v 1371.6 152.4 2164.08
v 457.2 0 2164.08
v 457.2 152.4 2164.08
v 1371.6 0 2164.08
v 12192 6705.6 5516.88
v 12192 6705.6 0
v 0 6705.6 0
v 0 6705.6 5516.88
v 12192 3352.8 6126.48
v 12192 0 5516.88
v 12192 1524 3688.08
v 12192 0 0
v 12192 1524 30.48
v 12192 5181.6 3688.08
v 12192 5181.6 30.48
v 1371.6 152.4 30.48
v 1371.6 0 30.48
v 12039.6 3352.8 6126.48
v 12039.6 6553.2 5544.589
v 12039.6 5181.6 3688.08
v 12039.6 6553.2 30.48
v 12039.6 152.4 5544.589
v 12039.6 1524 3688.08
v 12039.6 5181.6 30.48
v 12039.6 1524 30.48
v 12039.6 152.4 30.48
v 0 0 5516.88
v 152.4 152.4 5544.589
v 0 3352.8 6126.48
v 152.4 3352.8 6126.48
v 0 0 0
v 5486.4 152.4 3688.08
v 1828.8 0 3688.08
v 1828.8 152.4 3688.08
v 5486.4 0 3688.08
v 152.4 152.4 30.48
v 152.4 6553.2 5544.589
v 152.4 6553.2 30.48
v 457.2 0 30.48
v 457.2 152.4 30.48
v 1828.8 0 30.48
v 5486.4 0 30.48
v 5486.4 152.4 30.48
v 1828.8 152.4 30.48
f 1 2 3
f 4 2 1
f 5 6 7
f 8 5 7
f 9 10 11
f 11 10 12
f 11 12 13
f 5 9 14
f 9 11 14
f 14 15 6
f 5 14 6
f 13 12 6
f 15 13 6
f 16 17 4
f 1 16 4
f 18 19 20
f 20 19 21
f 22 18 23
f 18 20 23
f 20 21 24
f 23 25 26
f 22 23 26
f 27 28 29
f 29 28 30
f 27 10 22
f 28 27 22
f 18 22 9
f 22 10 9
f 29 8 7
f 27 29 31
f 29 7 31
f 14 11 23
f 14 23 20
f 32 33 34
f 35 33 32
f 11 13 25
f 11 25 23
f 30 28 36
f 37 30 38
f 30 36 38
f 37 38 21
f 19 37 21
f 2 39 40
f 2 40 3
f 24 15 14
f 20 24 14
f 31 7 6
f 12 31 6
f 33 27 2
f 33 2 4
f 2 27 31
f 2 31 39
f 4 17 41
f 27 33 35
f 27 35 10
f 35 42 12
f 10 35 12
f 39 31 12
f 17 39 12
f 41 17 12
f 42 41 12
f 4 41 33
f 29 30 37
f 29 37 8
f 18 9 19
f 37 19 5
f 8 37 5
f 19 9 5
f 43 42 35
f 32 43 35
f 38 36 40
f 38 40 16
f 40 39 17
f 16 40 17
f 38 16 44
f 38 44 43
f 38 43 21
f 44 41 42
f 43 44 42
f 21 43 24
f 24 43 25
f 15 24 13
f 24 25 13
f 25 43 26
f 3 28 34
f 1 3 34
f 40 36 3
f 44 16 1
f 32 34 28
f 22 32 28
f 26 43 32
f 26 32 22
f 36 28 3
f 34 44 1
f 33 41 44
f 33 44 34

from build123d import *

# Parameters (mm, degrees)
F0_W      = 12192
F0_H      = 6705.6
F1_DEPTH  = 30.48
F2_W      = 11887.2
F2_H      = 152.4
F3_DEPTH  = 6096
F5_DEPTH  = 12192.001
F6_W      = 3657.6
F6_H      = 3657.6
F7_DEPTH  = 152.4
F8_W      = 3657.6
F8_H      = 3657.6
F9_DEPTH  = 152.4
F10_W     = 914.4
F10_H     = 2133.6
F11_DEPTH = 152.4


with BuildPart() as f1:
    # F0 (on Top) → F1 (new body)
    with BuildSketch(Plane.XY):
        with Locations((6096, 3352.8)):
            Rectangle(F0_W, F0_H)
    extrude(amount=F1_DEPTH)

    # F2 (on face) → F3 (join)
    with BuildSketch(Plane.XY.offset(30.48)):
        Polygon((152.4, 6705.6), (0, 6705.6), (0, 0), (152.4, 0), (152.4, 152.4), (152.4, 6553.2), align=None)
        Polygon((12192, 6705.6), (152.4, 6705.6), (152.4, 6553.2), (12039.6, 6553.2), (12192, 6553.2), align=None)
        with Locations((6096, 76.2)):
            Rectangle(F2_W, F2_H)
        Polygon((12192, 6553.2), (12039.6, 6553.2), (12039.6, 152.4), (12039.6, 0), (12192, 0), align=None)
    extrude(amount=F3_DEPTH)

    # F4 (on face) → F5 (cut, through all)
    with BuildSketch(Plane.YZ.offset(12192)):
        Polygon((6705.6, 6126.48), (3352.8, 6126.48), (6705.6, 5516.88), align=None)
        Polygon((3352.8, 6126.48), (0, 6126.48), (0, 5516.88), align=None)
    extrude(amount=-F5_DEPTH, mode=Mode.SUBTRACT)

    # F6 (on face) → F7 (cut)
    with BuildSketch(Plane.YZ.offset(12192)):
        with Locations((3352.8, 1859.28)):
            Rectangle(F6_W, F6_H)
    extrude(amount=-F7_DEPTH, mode=Mode.SUBTRACT)

    # F8 (on face) → F9 (cut)
    with BuildSketch(Plane.XZ):
        with Locations((3657.6, 1859.28)):
            Rectangle(F8_W, F8_H)
    extrude(amount=-F9_DEPTH, mode=Mode.SUBTRACT)

    # F10 (on face) → F11 (cut)
    with BuildSketch(Plane.XZ):
        with Locations((914.4, 1097.28)):
            Rectangle(F10_W, F10_H)
    extrude(amount=-F11_DEPTH, mode=Mode.SUBTRACT)


solid = f1.part
